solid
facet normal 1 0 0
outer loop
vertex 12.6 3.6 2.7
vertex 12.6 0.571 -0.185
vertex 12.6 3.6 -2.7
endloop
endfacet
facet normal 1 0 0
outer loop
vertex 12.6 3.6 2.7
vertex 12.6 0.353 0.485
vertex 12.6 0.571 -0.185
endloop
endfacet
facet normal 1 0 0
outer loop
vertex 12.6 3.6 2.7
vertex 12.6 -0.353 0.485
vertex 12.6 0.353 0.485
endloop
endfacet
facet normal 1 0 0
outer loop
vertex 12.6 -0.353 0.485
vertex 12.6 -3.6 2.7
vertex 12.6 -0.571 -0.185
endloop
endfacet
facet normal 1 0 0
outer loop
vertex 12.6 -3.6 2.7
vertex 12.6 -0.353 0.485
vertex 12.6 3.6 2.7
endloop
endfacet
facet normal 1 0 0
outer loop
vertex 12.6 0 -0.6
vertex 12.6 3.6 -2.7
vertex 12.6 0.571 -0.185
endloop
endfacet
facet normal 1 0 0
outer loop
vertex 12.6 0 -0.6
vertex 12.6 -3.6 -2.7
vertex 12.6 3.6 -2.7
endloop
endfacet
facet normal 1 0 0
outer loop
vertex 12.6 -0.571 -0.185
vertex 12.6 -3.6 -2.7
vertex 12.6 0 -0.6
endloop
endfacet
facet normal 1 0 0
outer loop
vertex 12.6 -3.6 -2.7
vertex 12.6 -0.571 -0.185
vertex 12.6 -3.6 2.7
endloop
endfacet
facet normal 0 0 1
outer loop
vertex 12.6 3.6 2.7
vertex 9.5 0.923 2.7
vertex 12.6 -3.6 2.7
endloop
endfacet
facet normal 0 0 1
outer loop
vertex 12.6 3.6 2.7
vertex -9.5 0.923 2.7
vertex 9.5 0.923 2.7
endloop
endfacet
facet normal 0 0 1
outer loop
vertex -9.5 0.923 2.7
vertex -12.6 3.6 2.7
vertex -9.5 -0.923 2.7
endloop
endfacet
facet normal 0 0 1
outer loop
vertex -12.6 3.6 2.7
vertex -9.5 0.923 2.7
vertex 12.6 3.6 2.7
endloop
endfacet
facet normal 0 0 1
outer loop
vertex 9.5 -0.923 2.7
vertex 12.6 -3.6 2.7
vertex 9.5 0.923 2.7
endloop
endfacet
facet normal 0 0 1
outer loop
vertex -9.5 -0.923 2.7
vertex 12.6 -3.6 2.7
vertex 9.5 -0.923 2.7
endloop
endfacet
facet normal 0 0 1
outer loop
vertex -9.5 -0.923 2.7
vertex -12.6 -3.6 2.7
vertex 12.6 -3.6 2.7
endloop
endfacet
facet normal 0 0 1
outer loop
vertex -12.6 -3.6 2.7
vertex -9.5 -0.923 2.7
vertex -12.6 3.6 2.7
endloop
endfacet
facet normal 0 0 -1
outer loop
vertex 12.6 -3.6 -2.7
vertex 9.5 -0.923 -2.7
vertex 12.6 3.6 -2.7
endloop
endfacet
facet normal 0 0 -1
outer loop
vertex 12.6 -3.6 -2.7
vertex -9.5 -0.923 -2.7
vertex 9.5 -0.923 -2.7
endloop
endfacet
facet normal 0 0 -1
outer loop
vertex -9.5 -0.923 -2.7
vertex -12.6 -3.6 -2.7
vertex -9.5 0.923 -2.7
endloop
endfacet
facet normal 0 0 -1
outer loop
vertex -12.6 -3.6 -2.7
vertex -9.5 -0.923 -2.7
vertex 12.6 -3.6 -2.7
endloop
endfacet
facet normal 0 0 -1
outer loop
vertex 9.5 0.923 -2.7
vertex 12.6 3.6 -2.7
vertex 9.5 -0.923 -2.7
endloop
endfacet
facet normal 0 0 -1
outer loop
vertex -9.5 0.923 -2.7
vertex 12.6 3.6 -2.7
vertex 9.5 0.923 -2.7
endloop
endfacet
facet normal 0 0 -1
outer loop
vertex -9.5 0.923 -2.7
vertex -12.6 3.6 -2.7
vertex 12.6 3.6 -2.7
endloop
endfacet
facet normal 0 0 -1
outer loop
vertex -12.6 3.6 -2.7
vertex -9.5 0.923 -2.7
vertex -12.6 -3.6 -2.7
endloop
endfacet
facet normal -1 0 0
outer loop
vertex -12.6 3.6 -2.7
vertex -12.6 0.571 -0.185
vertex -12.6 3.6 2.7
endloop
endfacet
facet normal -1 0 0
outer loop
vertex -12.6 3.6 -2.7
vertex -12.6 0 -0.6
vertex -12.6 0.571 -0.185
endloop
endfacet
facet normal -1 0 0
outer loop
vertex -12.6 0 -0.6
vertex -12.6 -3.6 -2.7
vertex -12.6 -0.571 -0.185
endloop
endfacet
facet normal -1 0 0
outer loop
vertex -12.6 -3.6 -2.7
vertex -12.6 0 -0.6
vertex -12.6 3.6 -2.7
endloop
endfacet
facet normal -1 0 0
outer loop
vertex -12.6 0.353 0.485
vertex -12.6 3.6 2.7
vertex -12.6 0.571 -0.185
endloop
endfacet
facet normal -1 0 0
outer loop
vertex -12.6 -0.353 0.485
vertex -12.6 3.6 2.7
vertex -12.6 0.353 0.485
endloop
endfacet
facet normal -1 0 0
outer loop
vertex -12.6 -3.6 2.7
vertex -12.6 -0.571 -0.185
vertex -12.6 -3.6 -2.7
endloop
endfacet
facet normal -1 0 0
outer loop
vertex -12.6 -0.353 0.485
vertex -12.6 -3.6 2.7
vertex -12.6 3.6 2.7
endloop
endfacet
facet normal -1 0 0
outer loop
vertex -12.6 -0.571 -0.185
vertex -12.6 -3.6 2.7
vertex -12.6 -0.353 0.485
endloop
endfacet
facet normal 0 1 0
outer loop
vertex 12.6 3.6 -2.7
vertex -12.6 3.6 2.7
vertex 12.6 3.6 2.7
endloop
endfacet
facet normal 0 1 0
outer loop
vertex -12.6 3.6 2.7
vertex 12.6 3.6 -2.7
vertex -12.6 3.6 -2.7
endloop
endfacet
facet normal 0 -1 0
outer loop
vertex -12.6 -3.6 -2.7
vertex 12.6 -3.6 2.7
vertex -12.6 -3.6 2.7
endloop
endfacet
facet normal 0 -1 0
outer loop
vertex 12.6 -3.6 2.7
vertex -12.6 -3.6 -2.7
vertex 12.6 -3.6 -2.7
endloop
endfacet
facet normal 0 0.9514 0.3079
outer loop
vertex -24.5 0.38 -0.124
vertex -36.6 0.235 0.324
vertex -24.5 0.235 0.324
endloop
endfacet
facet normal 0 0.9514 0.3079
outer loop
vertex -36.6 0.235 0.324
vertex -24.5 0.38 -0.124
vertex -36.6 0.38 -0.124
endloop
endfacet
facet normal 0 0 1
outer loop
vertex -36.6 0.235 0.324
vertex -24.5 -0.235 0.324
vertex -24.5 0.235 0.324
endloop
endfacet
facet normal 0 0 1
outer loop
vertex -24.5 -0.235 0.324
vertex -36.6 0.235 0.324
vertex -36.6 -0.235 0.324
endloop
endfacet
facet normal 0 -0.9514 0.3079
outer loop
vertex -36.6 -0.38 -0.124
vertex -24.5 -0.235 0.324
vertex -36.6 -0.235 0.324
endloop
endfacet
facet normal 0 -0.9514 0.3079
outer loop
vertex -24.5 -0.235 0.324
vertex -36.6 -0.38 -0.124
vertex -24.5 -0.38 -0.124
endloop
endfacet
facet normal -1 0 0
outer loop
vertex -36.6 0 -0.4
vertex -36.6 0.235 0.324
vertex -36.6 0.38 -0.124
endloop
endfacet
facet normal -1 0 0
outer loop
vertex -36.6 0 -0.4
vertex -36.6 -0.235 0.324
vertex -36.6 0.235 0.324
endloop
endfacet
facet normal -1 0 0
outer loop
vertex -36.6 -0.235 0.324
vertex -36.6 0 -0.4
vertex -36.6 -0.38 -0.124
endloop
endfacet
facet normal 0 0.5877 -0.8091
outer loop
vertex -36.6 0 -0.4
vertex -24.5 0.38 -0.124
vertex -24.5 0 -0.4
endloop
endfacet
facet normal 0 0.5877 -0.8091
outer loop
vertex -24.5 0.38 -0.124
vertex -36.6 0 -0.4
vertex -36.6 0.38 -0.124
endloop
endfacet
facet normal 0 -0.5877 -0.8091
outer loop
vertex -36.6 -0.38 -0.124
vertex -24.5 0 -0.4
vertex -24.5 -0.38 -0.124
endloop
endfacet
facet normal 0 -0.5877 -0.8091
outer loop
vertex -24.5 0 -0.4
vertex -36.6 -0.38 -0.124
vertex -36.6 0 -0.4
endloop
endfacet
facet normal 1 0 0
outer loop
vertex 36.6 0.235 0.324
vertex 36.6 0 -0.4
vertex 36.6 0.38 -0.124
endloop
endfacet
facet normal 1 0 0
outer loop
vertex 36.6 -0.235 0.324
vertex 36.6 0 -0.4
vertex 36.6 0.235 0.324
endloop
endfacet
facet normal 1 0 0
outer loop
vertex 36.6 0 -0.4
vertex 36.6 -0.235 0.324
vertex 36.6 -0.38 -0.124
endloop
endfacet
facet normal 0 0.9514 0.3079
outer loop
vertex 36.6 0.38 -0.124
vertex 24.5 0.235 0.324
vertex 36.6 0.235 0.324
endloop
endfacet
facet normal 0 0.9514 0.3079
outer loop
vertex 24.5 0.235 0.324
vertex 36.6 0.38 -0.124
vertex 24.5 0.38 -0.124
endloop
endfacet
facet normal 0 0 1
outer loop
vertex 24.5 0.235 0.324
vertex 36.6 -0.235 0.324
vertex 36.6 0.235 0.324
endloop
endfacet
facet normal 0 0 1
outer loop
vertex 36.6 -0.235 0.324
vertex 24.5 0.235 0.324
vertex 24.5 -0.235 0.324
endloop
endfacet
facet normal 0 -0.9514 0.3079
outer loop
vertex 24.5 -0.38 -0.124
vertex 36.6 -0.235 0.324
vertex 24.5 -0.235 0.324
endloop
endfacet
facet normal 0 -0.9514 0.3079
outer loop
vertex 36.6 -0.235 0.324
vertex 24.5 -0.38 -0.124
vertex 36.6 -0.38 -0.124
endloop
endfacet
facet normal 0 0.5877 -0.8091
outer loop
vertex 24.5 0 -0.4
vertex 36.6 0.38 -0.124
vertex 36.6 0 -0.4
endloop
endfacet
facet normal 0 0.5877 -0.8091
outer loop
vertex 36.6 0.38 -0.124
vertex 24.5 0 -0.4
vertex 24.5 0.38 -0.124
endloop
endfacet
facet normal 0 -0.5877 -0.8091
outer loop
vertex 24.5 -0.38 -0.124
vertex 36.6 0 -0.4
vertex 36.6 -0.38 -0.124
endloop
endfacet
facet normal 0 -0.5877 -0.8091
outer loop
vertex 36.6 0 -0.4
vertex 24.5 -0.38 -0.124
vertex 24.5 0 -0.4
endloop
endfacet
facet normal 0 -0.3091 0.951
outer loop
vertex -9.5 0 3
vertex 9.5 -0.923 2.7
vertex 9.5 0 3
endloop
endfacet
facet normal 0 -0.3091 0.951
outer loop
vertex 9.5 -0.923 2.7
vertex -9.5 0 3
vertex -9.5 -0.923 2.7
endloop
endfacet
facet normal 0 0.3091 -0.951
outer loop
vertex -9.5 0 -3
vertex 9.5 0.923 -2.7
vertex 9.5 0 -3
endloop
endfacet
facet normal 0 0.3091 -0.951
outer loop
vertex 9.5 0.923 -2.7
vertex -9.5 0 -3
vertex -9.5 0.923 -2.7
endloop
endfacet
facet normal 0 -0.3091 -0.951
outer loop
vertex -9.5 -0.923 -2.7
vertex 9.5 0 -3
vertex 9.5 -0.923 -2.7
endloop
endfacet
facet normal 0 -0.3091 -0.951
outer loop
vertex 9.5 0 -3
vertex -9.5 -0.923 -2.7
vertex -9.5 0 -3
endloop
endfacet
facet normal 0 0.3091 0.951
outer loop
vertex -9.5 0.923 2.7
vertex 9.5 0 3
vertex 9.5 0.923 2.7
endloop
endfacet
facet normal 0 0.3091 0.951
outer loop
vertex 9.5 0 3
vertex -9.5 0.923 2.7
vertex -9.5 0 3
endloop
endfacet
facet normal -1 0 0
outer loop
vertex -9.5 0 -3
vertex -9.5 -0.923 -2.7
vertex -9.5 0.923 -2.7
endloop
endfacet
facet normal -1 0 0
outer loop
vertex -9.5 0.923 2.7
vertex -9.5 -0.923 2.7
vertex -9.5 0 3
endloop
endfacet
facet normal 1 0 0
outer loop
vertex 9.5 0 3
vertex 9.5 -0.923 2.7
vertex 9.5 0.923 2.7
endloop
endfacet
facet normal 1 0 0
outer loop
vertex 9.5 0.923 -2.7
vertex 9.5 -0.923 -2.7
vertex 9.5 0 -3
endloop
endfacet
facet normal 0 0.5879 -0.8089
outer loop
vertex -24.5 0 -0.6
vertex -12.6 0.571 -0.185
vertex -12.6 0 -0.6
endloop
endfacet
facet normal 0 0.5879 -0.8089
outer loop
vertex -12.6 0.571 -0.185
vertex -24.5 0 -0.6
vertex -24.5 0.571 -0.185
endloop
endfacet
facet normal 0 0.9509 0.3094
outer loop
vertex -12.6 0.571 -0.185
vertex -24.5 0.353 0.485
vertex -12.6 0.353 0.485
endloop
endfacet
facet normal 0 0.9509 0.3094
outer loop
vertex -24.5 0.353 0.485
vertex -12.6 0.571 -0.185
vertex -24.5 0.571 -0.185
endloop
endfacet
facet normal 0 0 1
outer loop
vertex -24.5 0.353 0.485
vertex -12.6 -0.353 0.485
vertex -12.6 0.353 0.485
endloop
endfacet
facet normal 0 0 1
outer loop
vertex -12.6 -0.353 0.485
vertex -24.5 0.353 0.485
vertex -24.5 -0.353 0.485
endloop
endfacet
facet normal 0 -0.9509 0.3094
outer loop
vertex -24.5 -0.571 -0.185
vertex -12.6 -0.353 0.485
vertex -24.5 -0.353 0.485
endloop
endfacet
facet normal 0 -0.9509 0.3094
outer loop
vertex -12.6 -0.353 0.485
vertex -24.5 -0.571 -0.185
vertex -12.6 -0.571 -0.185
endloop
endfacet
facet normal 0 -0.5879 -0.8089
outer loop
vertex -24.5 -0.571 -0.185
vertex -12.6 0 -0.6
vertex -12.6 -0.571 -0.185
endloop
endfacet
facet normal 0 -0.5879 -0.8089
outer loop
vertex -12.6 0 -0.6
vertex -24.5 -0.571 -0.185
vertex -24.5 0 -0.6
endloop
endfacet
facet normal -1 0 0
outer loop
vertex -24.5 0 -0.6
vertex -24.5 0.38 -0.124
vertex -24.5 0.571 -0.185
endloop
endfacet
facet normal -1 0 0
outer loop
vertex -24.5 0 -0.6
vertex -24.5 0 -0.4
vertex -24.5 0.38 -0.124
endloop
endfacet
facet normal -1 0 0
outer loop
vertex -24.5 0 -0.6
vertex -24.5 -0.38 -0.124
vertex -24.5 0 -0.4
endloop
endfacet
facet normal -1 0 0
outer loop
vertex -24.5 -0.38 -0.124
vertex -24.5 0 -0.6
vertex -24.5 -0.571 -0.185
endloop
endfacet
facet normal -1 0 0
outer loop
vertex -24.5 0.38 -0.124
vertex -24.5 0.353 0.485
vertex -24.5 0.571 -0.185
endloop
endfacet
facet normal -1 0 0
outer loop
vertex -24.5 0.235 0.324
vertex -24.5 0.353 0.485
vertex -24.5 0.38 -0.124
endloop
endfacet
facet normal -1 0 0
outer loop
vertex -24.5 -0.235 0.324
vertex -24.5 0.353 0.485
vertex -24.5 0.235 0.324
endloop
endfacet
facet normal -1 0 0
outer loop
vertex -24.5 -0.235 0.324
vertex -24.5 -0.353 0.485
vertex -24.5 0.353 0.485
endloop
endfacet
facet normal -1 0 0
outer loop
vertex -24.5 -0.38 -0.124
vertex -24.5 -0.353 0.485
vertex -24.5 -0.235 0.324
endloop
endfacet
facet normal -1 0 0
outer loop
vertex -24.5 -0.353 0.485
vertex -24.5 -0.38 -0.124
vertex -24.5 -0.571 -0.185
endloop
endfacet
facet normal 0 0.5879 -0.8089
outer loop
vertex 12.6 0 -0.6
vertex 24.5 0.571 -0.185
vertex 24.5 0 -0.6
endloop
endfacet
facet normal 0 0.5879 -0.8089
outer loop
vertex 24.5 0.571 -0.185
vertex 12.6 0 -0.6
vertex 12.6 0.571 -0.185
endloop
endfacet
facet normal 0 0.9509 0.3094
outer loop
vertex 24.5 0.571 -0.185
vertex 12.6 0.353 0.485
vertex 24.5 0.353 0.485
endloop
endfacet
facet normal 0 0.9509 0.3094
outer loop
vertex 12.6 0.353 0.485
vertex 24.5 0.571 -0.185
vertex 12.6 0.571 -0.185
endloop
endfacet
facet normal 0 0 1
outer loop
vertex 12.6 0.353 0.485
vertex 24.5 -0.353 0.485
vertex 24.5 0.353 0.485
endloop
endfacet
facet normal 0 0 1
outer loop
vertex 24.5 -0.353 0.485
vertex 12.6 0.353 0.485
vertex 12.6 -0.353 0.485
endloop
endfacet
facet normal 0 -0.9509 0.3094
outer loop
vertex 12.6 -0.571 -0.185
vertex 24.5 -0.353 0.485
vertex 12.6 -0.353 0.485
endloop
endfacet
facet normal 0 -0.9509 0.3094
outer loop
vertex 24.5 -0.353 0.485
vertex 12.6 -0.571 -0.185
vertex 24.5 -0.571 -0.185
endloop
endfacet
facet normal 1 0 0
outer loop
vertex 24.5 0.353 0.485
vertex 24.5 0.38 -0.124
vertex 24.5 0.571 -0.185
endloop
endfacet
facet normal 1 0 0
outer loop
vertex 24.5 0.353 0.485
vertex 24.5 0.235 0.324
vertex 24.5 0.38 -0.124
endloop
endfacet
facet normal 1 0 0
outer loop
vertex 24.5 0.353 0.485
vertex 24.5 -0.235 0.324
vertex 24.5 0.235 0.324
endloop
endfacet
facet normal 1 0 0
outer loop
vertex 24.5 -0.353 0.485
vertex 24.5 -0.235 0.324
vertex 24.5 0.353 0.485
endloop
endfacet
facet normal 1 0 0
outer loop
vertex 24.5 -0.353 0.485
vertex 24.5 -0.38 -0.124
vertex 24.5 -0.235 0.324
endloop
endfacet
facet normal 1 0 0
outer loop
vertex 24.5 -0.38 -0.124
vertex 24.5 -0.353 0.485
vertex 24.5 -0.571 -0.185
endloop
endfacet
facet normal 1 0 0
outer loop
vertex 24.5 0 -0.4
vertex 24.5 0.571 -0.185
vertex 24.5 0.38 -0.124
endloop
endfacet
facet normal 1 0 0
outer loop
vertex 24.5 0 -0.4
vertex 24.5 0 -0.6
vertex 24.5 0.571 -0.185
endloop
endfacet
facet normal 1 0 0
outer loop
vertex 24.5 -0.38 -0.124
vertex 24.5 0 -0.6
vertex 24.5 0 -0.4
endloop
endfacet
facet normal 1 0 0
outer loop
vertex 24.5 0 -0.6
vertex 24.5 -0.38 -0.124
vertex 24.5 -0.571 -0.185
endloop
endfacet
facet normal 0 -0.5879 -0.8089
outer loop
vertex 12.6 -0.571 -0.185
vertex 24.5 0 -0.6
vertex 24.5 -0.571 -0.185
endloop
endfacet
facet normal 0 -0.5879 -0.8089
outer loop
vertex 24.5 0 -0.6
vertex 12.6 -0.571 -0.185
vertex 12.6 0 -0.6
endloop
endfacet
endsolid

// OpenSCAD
// Parameters
resistance_ohms = 6.8; //[3.4:13.6:0.1]
power_w = 3; //[1.5:6:0.5]
package_style = 0; //[0:1:1]
body_length_mm = 18; //[9:36:0.5]
body_diameter_mm = 6; //[3:12:0.5]
lead_diameter_mm = 0.8; //[0.4:1.6:0.05]
lead_length_each_mm = 25; //[12.5:50:1]
end_cap_length_mm = 1.5; //[0.75:3:0.1]
lead_exit_fillet_radius_mm = 0.8; //[0.4:1.6:0.05]
banding_enabled = 0; //[0:1:1]
tolerance_percent = 5; //[1:10:1]
overlap_mm = 1; //[0.5:2:0.1]
band_width_mm = 1.2; //[0.6:2.4:0.1]
band_radial_thickness_mm = 0.2; //[0.1:0.6:0.05]

// Resistor - complete geometry
module resistor() {
  color("DimGray") {
    // Body
    translate([0, 0, 0])
      rotate([0, 90, 0])
      cylinder(r=body_diameter_mm/2, h=body_length_mm, center=true);
    
    // End Caps
    translate([-(body_length_mm/2 - end_cap_length_mm/2 + overlap_mm/2), 0, 0])
      rotate([0, 90, 0])
      cylinder(r=body_diameter_mm/2, h=end_cap_length_mm, center=true);
    translate([(body_length_mm/2 - end_cap_length_mm/2 + overlap_mm/2), 0, 0])
      rotate([0, 90, 0])
      cylinder(r=body_diameter_mm/2, h=end_cap_length_mm, center=true);
    
    // Leads
    translate([-(body_length_mm/2 + lead_length_each_mm/2 + overlap_mm/2), 0, 0])
      rotate([0, 90, 0])
      cylinder(r=lead_diameter_mm/2, h=lead_length_each_mm + end_cap_length_mm + overlap_mm, center=true);
    translate([(body_length_mm/2 + lead_length_each_mm/2 + overlap_mm/2), 0, 0])
      rotate([0, 90, 0])
      cylinder(r=lead_diameter_mm/2, h=lead_length_each_mm + end_cap_length_mm + overlap_mm, center=true);
    
    // Lead Exit Fillets
    translate([-(body_length_mm/2 - (end_cap_length_mm + overlap_mm)/2), 0, 0])
      rotate([0, 90, 0])
      cylinder(r=lead_exit_fillet_radius_mm, h=end_cap_length_mm + overlap_mm, center=true);
    translate([(body_length_mm/2 - (end_cap_length_mm + overlap_mm)/2), 0, 0])
      rotate([0, 90, 0])
      cylinder(r=lead_exit_fillet_radius_mm, h=end_cap_length_mm + overlap_mm, center=true);
  }
}

// Sleeved Resistor - complete geometry
module sleeved_resistor() {
  resistor();
  color("Silver") {
    // Sleeves
    translate([-(body_length_mm/2 + (lead_length_each_mm*0.6)/2 + overlap_mm/2), 0, 0])
      rotate([0, 90, 0])
      cylinder(r=lead_diameter_mm/2 + band_radial_thickness_mm, h=lead_length_each_mm*0.6, center=true);
    translate([(body_length_mm/2 + (lead_length_each_mm*0.6)/2 + overlap_mm/2), 0, 0])
      rotate([0, 90, 0])
      cylinder(r=lead_diameter_mm/2 + band_radial_thickness_mm, h=lead_length_each_mm*0.6, center=true);
  }
}

// Al Clad Resistor - complete geometry
module al_clad_resistor() {
  color("Black") {
    // Al Clad Body
    translate([0, 0, 0])
      cube([body_length_mm*1.4, body_diameter_mm*1.2, body_diameter_mm*0.9], center=true);
    
    // Al Clad Core
    translate([0, 0, 0])
      rotate([0, 90, 0])
      cylinder(r=body_diameter_mm*0.35, h=body_length_mm*1.2, center=true);
    
    // Al Clad Leads
    translate([-(body_length_mm*1.4/2 + lead_length_each_mm/2 - overlap_mm), 0, 0])
      rotate([0, 90, 0])
      cylinder(r=lead_diameter_mm/2, h=lead_length_each_mm, center=true);
    translate([(body_length_mm*1.4/2 + lead_length_each_mm/2 - overlap_mm), 0, 0])
      rotate([0, 90, 0])
      cylinder(r=lead_diameter_mm/2, h=lead_length_each_mm, center=true);
  }
}

// Al Clad Resistor Assembly - complete geometry
module al_clad_resistor_assembly() {
  al_clad_resistor();
  sleeved_resistor();
}

// Assembly
module assembly() {
  al_clad_resistor_assembly();
}

assembly();
